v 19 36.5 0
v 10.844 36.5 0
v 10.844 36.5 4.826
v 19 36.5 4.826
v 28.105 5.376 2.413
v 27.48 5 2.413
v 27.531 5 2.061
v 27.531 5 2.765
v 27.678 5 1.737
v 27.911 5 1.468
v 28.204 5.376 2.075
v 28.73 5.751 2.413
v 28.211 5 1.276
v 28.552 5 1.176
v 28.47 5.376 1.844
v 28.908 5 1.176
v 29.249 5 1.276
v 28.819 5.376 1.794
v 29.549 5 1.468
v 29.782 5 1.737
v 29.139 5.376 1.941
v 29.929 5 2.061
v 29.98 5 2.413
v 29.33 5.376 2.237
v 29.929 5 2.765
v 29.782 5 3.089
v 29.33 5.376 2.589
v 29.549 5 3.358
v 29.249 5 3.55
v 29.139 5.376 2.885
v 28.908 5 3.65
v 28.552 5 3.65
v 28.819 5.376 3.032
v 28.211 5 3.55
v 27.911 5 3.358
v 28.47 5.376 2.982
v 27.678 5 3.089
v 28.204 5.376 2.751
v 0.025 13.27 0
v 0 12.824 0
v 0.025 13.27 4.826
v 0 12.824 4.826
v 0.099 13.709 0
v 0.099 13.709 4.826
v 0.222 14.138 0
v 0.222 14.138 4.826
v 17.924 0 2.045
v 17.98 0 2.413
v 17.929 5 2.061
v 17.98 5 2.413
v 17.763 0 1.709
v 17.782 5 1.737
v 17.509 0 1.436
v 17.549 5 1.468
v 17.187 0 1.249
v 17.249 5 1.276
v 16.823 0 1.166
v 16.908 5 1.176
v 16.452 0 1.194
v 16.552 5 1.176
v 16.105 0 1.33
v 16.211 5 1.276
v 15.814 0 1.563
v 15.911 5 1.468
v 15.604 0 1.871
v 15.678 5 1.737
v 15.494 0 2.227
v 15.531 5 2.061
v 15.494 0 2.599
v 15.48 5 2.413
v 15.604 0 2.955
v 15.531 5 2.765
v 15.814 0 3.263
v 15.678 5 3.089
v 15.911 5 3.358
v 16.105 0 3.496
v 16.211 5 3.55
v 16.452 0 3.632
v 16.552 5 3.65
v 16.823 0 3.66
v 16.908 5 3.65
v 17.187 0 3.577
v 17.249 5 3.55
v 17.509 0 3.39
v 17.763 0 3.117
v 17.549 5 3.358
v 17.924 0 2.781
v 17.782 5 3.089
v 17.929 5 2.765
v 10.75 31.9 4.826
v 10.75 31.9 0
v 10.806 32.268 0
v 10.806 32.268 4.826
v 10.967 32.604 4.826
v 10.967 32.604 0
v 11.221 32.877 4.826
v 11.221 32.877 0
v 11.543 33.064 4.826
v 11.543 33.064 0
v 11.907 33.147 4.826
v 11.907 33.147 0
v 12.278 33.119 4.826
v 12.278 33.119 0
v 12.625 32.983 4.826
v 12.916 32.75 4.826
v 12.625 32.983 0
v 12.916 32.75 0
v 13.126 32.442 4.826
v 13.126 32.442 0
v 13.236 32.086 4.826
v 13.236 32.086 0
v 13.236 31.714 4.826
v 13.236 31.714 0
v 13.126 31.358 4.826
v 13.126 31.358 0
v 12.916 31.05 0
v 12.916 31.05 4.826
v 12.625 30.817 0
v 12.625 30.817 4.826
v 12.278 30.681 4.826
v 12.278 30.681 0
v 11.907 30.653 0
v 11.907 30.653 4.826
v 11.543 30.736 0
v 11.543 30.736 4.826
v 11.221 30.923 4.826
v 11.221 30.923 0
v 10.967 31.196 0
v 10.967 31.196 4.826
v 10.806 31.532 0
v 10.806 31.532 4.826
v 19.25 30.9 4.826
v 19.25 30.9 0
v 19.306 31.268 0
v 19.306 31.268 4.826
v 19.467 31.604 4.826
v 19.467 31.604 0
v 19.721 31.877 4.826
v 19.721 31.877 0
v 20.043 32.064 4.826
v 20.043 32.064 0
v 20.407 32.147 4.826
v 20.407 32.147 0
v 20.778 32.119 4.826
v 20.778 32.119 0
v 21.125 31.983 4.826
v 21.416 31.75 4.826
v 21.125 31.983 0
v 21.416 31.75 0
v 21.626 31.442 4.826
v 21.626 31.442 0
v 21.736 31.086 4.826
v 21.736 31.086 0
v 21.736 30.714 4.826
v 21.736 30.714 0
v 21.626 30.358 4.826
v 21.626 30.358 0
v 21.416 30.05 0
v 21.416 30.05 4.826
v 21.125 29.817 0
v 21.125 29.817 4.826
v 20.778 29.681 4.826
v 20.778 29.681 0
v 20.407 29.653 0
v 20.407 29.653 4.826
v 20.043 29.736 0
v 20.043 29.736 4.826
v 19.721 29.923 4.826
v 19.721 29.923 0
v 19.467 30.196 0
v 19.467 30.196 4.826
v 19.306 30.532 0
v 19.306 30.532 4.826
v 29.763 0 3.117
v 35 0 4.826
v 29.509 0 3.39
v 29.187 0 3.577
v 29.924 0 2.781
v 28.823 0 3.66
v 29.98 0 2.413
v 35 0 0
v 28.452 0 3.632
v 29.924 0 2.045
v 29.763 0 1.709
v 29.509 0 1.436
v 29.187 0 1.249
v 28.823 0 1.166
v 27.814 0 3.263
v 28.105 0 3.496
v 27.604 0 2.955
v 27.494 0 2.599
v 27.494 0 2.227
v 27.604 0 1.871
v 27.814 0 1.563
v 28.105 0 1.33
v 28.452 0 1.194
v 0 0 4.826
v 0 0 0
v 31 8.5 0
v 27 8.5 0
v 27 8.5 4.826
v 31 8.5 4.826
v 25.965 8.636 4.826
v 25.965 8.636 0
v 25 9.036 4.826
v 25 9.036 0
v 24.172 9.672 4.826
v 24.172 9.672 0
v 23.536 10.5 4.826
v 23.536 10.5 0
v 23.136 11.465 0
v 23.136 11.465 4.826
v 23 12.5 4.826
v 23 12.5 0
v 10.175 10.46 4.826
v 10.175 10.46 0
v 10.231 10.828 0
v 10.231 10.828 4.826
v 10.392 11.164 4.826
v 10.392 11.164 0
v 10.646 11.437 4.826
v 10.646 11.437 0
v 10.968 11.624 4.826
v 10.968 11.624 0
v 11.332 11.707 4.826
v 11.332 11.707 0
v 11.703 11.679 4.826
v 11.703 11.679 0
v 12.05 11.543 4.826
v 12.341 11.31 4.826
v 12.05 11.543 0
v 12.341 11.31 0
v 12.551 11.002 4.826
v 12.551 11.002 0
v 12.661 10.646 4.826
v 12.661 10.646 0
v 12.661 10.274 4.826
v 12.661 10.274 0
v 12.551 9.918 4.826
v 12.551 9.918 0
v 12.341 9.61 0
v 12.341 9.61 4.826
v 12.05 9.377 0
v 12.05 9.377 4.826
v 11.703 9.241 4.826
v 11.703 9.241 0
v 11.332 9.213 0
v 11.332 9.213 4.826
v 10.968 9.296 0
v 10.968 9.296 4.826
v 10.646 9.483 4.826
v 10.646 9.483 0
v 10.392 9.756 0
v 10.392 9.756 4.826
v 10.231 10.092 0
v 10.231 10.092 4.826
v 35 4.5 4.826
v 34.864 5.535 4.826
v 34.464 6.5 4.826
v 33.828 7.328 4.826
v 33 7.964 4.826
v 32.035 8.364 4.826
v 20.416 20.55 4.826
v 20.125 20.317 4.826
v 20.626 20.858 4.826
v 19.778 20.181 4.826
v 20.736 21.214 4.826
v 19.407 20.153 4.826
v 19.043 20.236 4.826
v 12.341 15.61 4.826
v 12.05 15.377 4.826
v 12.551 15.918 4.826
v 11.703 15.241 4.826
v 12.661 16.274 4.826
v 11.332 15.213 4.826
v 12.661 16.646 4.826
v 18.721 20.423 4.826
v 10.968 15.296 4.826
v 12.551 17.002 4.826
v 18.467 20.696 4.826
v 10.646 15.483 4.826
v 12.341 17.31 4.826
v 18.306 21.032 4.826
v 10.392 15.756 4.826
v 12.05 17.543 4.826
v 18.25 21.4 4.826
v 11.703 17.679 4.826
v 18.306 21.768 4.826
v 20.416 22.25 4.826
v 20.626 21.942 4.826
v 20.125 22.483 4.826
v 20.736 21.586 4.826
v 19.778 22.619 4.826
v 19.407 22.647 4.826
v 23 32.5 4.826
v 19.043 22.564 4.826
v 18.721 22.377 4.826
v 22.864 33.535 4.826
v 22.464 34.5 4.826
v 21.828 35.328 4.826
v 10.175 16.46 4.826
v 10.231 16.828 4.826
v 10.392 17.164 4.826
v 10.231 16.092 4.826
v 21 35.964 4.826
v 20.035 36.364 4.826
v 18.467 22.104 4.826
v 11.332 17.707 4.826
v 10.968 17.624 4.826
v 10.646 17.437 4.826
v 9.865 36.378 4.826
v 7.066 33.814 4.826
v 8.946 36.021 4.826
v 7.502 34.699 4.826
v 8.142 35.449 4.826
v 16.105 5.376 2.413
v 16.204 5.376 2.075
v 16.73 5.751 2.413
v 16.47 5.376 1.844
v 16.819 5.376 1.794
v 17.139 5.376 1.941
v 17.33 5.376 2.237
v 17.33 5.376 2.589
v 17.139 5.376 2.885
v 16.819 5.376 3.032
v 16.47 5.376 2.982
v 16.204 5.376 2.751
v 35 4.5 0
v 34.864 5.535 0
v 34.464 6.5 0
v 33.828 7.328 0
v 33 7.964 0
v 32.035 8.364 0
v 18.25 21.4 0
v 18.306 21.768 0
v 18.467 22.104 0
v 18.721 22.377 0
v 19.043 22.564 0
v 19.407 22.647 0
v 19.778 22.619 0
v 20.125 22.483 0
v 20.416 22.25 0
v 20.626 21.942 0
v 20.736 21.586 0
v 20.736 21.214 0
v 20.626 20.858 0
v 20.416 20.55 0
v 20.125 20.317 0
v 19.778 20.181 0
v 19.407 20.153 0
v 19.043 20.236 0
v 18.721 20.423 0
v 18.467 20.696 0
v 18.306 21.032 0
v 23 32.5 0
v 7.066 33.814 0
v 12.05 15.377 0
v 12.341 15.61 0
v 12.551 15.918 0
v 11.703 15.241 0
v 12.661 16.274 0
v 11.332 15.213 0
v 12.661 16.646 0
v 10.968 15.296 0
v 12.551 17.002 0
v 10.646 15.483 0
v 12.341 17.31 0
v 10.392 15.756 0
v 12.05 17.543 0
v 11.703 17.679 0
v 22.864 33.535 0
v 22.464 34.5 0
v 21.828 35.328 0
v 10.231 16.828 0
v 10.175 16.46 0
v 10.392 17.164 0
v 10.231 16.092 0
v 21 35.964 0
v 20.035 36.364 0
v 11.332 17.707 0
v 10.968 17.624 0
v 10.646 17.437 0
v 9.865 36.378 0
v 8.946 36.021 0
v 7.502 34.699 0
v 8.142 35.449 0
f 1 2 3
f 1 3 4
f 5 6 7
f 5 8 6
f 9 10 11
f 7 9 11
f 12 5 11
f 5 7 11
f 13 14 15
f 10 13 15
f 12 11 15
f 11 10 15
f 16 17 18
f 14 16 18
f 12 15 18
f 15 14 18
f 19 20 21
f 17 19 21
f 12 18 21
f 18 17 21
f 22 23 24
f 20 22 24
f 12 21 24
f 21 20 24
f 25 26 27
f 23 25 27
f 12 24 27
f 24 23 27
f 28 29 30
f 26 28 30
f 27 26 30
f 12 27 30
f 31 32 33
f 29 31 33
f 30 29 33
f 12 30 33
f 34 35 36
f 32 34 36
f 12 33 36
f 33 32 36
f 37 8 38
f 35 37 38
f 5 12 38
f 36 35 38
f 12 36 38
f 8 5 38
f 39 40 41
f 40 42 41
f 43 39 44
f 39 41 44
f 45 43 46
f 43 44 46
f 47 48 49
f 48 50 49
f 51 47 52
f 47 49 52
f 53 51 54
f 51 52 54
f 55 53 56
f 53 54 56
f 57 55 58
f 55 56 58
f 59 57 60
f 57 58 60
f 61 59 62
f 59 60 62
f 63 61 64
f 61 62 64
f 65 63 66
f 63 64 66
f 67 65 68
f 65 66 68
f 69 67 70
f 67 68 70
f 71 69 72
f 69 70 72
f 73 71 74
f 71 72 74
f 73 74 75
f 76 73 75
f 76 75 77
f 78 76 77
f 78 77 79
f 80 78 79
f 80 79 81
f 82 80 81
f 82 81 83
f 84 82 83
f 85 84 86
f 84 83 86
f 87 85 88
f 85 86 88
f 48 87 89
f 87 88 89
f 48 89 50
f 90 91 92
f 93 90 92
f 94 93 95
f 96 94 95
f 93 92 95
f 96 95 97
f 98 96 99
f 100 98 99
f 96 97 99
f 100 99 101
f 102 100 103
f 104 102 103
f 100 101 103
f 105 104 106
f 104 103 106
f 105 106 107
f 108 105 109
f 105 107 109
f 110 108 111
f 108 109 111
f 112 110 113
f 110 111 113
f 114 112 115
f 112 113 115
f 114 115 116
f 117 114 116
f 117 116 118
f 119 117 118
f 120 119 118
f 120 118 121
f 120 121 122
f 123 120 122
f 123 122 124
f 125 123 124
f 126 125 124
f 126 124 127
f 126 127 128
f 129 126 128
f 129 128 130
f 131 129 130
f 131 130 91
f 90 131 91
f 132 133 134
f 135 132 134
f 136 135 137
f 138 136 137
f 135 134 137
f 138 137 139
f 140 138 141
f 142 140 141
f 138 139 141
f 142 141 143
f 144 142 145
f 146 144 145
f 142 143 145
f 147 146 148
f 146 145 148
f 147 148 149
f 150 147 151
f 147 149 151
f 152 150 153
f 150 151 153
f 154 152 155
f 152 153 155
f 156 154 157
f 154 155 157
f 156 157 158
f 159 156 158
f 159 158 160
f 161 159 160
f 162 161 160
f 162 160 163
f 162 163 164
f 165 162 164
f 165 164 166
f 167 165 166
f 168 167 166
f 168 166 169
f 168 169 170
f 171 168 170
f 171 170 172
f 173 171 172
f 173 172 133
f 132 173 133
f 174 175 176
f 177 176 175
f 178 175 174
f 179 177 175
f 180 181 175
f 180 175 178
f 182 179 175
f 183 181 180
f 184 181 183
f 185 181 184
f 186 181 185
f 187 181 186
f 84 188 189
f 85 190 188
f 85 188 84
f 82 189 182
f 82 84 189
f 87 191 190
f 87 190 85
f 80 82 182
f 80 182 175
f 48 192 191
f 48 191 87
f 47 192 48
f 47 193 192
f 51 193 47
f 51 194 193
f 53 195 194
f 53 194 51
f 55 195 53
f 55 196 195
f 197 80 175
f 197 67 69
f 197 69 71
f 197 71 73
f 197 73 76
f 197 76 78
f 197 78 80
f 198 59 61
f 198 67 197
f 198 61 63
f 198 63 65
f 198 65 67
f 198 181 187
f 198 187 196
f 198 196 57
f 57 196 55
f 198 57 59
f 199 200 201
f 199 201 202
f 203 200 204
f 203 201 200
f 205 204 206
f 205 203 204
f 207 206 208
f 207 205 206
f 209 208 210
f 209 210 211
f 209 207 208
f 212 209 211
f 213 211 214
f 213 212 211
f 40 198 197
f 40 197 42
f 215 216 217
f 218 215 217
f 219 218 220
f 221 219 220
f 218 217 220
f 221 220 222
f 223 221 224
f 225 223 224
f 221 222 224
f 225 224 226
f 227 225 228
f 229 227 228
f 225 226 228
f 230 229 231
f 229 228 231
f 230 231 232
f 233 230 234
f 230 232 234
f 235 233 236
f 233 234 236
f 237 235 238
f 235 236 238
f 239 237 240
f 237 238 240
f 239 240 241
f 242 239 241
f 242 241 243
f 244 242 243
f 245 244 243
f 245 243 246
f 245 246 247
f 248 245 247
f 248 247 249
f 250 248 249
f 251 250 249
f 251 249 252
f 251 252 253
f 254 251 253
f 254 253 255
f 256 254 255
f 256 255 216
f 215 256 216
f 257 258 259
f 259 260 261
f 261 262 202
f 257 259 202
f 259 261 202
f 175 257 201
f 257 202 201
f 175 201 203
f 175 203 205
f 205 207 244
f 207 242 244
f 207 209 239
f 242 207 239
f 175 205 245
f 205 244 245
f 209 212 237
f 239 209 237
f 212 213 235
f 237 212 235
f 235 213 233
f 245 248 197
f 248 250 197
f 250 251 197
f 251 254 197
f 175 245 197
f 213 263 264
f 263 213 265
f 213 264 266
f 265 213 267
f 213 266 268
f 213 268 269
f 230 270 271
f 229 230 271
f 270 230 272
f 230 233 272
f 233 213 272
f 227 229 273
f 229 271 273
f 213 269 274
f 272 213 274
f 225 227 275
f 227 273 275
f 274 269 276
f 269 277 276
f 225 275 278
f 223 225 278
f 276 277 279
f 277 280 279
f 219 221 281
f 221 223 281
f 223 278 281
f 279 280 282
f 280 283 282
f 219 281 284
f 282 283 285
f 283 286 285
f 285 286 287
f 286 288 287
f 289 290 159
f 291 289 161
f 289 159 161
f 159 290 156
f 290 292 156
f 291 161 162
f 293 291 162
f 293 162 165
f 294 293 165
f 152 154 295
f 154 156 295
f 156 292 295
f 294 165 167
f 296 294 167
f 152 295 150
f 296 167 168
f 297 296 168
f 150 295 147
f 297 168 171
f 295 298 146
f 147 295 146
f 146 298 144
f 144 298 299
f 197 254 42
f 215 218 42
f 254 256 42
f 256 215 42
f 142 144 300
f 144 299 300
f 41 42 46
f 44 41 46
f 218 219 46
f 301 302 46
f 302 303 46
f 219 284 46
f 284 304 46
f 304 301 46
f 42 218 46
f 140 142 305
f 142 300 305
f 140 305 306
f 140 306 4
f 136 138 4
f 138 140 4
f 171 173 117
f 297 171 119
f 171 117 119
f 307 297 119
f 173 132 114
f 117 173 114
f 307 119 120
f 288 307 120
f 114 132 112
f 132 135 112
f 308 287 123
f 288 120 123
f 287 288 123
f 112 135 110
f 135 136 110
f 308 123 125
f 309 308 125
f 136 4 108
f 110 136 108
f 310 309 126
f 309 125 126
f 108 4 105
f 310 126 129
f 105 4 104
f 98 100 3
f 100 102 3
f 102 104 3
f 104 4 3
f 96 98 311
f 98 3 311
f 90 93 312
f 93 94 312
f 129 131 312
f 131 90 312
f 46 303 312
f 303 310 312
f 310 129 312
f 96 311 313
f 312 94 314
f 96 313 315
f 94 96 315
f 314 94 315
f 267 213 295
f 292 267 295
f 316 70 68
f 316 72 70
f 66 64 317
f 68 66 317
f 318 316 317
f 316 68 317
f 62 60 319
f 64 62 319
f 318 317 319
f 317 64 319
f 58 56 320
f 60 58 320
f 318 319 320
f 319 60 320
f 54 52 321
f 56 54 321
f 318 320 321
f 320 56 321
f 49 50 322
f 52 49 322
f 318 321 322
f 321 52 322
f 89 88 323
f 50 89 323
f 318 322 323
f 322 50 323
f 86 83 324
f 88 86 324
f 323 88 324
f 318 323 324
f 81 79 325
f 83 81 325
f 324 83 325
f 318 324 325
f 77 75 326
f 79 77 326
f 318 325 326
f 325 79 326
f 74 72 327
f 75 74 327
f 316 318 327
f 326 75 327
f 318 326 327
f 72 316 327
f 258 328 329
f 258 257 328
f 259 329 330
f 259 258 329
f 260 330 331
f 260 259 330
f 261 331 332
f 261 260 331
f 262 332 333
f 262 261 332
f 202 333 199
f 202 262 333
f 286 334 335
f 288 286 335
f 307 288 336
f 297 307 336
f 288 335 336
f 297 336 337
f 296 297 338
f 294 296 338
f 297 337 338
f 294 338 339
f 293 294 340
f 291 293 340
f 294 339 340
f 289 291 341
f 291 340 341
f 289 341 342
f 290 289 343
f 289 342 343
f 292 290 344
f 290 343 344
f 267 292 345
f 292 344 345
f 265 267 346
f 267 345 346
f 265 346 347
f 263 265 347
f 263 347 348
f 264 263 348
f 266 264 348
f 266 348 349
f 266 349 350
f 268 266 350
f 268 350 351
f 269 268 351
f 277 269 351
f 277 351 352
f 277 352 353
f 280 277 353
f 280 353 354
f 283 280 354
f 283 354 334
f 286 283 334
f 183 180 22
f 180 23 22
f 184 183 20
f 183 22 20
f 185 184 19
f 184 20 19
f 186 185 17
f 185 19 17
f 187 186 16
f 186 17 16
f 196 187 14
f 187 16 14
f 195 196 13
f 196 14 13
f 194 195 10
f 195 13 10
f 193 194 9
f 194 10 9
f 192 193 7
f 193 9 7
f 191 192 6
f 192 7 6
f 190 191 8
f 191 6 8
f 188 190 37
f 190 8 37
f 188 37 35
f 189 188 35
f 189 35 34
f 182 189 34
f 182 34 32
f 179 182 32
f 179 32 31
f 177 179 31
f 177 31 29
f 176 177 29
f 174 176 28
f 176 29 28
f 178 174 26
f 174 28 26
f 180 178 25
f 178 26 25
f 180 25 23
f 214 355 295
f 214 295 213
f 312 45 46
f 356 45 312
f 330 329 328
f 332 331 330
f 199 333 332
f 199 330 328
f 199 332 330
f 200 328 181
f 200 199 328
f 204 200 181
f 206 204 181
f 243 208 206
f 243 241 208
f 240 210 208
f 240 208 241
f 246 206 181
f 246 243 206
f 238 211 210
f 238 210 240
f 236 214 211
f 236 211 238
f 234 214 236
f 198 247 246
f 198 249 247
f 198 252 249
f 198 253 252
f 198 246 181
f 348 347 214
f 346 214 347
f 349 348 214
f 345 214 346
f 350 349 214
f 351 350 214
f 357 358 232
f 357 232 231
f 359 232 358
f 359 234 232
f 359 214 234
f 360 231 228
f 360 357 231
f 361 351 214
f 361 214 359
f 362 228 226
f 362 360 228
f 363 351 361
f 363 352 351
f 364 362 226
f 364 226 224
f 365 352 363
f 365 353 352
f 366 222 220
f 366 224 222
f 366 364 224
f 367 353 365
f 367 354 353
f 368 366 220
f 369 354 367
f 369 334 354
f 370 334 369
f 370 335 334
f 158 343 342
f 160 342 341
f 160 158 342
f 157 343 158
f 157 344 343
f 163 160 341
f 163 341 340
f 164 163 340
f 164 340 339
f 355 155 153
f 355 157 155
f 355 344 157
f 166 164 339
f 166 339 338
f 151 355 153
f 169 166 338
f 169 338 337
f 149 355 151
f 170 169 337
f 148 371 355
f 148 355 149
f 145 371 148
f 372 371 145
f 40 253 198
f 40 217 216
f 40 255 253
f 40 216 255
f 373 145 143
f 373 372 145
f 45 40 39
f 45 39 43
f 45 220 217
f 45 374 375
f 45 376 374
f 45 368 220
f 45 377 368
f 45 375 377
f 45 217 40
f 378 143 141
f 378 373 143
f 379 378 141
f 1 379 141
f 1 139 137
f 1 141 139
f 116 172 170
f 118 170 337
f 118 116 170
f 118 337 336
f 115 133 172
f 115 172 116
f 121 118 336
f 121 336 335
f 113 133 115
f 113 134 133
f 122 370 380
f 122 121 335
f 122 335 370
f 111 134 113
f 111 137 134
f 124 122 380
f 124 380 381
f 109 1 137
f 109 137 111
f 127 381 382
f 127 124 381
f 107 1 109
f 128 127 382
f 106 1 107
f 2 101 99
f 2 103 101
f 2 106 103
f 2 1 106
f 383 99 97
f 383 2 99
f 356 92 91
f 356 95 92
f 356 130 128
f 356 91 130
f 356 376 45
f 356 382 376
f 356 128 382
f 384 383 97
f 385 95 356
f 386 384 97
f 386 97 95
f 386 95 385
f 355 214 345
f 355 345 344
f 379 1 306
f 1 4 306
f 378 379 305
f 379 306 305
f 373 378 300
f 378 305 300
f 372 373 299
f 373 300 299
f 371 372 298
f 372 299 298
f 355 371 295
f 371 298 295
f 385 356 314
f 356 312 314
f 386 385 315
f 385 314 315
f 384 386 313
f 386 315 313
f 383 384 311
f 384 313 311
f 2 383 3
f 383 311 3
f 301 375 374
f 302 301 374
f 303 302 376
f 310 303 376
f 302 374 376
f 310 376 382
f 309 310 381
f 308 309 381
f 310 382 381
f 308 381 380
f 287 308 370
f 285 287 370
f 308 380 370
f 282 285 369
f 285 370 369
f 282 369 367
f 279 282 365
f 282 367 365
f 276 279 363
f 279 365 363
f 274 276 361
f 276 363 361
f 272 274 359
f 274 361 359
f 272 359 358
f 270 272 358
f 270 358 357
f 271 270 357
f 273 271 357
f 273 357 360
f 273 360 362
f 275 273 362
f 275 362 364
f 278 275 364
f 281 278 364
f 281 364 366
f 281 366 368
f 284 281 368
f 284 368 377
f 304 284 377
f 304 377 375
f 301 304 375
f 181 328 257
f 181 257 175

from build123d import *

# Parameters (mm, degrees)
BOSS_EXTRUDE1_DEPTH       = 4.826
M3X0_5_TAPPED_HOLE2_D     = 2.5
M3X0_5_TAPPED_HOLE3_D     = 2.5
M3X0_5_TAPPED_HOLE3_DEPTH = 5
M3X0_5_TAPPED_HOLE3_TIP   = 0.751075774
FILLET2_R                 = 4
M3X0_5_TAPPED_HOLE4_D     = 2.5
M3X0_5_TAPPED_HOLE5_D     = 2.5


with BuildPart() as part:
    # Sketch1 → Boss-Extrude1 (new body)
    with BuildSketch(Plane.XY):
        Polygon((0, 0), (0, 13.5), (8, 36.5), (23, 36.5), (23, 8.5), (35, 8.5), (35, 0), align=None)
    extrude(amount=BOSS_EXTRUDE1_DEPTH)

    # M3x0.5 Tapped Hole2 (through all)
    with Locations(Plane.XY.offset(4.826)):
        with Locations((12, 31.9)):
            Hole(M3X0_5_TAPPED_HOLE2_D / 2)

    # M3x0.5 Tapped Hole3
    with Locations(Plane(origin=(0, 0, 0), x_dir=(-1, 0, 0), z_dir=(0, -1, 0))):
        with Locations((-16.73, -2.413), (-28.73, -2.413)):
            Hole(M3X0_5_TAPPED_HOLE3_D / 2, depth=M3X0_5_TAPPED_HOLE3_DEPTH)
            with Locations((0, 0, -(M3X0_5_TAPPED_HOLE3_DEPTH + M3X0_5_TAPPED_HOLE3_TIP / 2))):  # 118° drill point
                Cone(0, M3X0_5_TAPPED_HOLE3_D / 2, M3X0_5_TAPPED_HOLE3_TIP, mode=Mode.SUBTRACT)

    # Fillet2
    fillet2_edges = [part.edges().sort_by_distance(p)[0] for p in [
        (23, 36.5, 2.413),
        (23, 8.5, 2.413),
        (35, 8.5, 2.413),
        (0, 13.5, 2.413),
        (8, 36.5, 2.413),
    ]]
    fillet(fillet2_edges, radius=FILLET2_R)

    # M3x0.5 Tapped Hole4 (through all)
    with Locations(Plane.XY.offset(4.826)):
        with Locations((19.5, 21.4), (20.5, 30.9)):
            Hole(M3X0_5_TAPPED_HOLE4_D / 2)

    # M3x0.5 Tapped Hole5 (through all)
    with Locations(Plane.XY.offset(4.826)):
        with Locations((11.425, 16.46), (11.425, 10.46)):
            Hole(M3X0_5_TAPPED_HOLE5_D / 2)


solid = part.part
